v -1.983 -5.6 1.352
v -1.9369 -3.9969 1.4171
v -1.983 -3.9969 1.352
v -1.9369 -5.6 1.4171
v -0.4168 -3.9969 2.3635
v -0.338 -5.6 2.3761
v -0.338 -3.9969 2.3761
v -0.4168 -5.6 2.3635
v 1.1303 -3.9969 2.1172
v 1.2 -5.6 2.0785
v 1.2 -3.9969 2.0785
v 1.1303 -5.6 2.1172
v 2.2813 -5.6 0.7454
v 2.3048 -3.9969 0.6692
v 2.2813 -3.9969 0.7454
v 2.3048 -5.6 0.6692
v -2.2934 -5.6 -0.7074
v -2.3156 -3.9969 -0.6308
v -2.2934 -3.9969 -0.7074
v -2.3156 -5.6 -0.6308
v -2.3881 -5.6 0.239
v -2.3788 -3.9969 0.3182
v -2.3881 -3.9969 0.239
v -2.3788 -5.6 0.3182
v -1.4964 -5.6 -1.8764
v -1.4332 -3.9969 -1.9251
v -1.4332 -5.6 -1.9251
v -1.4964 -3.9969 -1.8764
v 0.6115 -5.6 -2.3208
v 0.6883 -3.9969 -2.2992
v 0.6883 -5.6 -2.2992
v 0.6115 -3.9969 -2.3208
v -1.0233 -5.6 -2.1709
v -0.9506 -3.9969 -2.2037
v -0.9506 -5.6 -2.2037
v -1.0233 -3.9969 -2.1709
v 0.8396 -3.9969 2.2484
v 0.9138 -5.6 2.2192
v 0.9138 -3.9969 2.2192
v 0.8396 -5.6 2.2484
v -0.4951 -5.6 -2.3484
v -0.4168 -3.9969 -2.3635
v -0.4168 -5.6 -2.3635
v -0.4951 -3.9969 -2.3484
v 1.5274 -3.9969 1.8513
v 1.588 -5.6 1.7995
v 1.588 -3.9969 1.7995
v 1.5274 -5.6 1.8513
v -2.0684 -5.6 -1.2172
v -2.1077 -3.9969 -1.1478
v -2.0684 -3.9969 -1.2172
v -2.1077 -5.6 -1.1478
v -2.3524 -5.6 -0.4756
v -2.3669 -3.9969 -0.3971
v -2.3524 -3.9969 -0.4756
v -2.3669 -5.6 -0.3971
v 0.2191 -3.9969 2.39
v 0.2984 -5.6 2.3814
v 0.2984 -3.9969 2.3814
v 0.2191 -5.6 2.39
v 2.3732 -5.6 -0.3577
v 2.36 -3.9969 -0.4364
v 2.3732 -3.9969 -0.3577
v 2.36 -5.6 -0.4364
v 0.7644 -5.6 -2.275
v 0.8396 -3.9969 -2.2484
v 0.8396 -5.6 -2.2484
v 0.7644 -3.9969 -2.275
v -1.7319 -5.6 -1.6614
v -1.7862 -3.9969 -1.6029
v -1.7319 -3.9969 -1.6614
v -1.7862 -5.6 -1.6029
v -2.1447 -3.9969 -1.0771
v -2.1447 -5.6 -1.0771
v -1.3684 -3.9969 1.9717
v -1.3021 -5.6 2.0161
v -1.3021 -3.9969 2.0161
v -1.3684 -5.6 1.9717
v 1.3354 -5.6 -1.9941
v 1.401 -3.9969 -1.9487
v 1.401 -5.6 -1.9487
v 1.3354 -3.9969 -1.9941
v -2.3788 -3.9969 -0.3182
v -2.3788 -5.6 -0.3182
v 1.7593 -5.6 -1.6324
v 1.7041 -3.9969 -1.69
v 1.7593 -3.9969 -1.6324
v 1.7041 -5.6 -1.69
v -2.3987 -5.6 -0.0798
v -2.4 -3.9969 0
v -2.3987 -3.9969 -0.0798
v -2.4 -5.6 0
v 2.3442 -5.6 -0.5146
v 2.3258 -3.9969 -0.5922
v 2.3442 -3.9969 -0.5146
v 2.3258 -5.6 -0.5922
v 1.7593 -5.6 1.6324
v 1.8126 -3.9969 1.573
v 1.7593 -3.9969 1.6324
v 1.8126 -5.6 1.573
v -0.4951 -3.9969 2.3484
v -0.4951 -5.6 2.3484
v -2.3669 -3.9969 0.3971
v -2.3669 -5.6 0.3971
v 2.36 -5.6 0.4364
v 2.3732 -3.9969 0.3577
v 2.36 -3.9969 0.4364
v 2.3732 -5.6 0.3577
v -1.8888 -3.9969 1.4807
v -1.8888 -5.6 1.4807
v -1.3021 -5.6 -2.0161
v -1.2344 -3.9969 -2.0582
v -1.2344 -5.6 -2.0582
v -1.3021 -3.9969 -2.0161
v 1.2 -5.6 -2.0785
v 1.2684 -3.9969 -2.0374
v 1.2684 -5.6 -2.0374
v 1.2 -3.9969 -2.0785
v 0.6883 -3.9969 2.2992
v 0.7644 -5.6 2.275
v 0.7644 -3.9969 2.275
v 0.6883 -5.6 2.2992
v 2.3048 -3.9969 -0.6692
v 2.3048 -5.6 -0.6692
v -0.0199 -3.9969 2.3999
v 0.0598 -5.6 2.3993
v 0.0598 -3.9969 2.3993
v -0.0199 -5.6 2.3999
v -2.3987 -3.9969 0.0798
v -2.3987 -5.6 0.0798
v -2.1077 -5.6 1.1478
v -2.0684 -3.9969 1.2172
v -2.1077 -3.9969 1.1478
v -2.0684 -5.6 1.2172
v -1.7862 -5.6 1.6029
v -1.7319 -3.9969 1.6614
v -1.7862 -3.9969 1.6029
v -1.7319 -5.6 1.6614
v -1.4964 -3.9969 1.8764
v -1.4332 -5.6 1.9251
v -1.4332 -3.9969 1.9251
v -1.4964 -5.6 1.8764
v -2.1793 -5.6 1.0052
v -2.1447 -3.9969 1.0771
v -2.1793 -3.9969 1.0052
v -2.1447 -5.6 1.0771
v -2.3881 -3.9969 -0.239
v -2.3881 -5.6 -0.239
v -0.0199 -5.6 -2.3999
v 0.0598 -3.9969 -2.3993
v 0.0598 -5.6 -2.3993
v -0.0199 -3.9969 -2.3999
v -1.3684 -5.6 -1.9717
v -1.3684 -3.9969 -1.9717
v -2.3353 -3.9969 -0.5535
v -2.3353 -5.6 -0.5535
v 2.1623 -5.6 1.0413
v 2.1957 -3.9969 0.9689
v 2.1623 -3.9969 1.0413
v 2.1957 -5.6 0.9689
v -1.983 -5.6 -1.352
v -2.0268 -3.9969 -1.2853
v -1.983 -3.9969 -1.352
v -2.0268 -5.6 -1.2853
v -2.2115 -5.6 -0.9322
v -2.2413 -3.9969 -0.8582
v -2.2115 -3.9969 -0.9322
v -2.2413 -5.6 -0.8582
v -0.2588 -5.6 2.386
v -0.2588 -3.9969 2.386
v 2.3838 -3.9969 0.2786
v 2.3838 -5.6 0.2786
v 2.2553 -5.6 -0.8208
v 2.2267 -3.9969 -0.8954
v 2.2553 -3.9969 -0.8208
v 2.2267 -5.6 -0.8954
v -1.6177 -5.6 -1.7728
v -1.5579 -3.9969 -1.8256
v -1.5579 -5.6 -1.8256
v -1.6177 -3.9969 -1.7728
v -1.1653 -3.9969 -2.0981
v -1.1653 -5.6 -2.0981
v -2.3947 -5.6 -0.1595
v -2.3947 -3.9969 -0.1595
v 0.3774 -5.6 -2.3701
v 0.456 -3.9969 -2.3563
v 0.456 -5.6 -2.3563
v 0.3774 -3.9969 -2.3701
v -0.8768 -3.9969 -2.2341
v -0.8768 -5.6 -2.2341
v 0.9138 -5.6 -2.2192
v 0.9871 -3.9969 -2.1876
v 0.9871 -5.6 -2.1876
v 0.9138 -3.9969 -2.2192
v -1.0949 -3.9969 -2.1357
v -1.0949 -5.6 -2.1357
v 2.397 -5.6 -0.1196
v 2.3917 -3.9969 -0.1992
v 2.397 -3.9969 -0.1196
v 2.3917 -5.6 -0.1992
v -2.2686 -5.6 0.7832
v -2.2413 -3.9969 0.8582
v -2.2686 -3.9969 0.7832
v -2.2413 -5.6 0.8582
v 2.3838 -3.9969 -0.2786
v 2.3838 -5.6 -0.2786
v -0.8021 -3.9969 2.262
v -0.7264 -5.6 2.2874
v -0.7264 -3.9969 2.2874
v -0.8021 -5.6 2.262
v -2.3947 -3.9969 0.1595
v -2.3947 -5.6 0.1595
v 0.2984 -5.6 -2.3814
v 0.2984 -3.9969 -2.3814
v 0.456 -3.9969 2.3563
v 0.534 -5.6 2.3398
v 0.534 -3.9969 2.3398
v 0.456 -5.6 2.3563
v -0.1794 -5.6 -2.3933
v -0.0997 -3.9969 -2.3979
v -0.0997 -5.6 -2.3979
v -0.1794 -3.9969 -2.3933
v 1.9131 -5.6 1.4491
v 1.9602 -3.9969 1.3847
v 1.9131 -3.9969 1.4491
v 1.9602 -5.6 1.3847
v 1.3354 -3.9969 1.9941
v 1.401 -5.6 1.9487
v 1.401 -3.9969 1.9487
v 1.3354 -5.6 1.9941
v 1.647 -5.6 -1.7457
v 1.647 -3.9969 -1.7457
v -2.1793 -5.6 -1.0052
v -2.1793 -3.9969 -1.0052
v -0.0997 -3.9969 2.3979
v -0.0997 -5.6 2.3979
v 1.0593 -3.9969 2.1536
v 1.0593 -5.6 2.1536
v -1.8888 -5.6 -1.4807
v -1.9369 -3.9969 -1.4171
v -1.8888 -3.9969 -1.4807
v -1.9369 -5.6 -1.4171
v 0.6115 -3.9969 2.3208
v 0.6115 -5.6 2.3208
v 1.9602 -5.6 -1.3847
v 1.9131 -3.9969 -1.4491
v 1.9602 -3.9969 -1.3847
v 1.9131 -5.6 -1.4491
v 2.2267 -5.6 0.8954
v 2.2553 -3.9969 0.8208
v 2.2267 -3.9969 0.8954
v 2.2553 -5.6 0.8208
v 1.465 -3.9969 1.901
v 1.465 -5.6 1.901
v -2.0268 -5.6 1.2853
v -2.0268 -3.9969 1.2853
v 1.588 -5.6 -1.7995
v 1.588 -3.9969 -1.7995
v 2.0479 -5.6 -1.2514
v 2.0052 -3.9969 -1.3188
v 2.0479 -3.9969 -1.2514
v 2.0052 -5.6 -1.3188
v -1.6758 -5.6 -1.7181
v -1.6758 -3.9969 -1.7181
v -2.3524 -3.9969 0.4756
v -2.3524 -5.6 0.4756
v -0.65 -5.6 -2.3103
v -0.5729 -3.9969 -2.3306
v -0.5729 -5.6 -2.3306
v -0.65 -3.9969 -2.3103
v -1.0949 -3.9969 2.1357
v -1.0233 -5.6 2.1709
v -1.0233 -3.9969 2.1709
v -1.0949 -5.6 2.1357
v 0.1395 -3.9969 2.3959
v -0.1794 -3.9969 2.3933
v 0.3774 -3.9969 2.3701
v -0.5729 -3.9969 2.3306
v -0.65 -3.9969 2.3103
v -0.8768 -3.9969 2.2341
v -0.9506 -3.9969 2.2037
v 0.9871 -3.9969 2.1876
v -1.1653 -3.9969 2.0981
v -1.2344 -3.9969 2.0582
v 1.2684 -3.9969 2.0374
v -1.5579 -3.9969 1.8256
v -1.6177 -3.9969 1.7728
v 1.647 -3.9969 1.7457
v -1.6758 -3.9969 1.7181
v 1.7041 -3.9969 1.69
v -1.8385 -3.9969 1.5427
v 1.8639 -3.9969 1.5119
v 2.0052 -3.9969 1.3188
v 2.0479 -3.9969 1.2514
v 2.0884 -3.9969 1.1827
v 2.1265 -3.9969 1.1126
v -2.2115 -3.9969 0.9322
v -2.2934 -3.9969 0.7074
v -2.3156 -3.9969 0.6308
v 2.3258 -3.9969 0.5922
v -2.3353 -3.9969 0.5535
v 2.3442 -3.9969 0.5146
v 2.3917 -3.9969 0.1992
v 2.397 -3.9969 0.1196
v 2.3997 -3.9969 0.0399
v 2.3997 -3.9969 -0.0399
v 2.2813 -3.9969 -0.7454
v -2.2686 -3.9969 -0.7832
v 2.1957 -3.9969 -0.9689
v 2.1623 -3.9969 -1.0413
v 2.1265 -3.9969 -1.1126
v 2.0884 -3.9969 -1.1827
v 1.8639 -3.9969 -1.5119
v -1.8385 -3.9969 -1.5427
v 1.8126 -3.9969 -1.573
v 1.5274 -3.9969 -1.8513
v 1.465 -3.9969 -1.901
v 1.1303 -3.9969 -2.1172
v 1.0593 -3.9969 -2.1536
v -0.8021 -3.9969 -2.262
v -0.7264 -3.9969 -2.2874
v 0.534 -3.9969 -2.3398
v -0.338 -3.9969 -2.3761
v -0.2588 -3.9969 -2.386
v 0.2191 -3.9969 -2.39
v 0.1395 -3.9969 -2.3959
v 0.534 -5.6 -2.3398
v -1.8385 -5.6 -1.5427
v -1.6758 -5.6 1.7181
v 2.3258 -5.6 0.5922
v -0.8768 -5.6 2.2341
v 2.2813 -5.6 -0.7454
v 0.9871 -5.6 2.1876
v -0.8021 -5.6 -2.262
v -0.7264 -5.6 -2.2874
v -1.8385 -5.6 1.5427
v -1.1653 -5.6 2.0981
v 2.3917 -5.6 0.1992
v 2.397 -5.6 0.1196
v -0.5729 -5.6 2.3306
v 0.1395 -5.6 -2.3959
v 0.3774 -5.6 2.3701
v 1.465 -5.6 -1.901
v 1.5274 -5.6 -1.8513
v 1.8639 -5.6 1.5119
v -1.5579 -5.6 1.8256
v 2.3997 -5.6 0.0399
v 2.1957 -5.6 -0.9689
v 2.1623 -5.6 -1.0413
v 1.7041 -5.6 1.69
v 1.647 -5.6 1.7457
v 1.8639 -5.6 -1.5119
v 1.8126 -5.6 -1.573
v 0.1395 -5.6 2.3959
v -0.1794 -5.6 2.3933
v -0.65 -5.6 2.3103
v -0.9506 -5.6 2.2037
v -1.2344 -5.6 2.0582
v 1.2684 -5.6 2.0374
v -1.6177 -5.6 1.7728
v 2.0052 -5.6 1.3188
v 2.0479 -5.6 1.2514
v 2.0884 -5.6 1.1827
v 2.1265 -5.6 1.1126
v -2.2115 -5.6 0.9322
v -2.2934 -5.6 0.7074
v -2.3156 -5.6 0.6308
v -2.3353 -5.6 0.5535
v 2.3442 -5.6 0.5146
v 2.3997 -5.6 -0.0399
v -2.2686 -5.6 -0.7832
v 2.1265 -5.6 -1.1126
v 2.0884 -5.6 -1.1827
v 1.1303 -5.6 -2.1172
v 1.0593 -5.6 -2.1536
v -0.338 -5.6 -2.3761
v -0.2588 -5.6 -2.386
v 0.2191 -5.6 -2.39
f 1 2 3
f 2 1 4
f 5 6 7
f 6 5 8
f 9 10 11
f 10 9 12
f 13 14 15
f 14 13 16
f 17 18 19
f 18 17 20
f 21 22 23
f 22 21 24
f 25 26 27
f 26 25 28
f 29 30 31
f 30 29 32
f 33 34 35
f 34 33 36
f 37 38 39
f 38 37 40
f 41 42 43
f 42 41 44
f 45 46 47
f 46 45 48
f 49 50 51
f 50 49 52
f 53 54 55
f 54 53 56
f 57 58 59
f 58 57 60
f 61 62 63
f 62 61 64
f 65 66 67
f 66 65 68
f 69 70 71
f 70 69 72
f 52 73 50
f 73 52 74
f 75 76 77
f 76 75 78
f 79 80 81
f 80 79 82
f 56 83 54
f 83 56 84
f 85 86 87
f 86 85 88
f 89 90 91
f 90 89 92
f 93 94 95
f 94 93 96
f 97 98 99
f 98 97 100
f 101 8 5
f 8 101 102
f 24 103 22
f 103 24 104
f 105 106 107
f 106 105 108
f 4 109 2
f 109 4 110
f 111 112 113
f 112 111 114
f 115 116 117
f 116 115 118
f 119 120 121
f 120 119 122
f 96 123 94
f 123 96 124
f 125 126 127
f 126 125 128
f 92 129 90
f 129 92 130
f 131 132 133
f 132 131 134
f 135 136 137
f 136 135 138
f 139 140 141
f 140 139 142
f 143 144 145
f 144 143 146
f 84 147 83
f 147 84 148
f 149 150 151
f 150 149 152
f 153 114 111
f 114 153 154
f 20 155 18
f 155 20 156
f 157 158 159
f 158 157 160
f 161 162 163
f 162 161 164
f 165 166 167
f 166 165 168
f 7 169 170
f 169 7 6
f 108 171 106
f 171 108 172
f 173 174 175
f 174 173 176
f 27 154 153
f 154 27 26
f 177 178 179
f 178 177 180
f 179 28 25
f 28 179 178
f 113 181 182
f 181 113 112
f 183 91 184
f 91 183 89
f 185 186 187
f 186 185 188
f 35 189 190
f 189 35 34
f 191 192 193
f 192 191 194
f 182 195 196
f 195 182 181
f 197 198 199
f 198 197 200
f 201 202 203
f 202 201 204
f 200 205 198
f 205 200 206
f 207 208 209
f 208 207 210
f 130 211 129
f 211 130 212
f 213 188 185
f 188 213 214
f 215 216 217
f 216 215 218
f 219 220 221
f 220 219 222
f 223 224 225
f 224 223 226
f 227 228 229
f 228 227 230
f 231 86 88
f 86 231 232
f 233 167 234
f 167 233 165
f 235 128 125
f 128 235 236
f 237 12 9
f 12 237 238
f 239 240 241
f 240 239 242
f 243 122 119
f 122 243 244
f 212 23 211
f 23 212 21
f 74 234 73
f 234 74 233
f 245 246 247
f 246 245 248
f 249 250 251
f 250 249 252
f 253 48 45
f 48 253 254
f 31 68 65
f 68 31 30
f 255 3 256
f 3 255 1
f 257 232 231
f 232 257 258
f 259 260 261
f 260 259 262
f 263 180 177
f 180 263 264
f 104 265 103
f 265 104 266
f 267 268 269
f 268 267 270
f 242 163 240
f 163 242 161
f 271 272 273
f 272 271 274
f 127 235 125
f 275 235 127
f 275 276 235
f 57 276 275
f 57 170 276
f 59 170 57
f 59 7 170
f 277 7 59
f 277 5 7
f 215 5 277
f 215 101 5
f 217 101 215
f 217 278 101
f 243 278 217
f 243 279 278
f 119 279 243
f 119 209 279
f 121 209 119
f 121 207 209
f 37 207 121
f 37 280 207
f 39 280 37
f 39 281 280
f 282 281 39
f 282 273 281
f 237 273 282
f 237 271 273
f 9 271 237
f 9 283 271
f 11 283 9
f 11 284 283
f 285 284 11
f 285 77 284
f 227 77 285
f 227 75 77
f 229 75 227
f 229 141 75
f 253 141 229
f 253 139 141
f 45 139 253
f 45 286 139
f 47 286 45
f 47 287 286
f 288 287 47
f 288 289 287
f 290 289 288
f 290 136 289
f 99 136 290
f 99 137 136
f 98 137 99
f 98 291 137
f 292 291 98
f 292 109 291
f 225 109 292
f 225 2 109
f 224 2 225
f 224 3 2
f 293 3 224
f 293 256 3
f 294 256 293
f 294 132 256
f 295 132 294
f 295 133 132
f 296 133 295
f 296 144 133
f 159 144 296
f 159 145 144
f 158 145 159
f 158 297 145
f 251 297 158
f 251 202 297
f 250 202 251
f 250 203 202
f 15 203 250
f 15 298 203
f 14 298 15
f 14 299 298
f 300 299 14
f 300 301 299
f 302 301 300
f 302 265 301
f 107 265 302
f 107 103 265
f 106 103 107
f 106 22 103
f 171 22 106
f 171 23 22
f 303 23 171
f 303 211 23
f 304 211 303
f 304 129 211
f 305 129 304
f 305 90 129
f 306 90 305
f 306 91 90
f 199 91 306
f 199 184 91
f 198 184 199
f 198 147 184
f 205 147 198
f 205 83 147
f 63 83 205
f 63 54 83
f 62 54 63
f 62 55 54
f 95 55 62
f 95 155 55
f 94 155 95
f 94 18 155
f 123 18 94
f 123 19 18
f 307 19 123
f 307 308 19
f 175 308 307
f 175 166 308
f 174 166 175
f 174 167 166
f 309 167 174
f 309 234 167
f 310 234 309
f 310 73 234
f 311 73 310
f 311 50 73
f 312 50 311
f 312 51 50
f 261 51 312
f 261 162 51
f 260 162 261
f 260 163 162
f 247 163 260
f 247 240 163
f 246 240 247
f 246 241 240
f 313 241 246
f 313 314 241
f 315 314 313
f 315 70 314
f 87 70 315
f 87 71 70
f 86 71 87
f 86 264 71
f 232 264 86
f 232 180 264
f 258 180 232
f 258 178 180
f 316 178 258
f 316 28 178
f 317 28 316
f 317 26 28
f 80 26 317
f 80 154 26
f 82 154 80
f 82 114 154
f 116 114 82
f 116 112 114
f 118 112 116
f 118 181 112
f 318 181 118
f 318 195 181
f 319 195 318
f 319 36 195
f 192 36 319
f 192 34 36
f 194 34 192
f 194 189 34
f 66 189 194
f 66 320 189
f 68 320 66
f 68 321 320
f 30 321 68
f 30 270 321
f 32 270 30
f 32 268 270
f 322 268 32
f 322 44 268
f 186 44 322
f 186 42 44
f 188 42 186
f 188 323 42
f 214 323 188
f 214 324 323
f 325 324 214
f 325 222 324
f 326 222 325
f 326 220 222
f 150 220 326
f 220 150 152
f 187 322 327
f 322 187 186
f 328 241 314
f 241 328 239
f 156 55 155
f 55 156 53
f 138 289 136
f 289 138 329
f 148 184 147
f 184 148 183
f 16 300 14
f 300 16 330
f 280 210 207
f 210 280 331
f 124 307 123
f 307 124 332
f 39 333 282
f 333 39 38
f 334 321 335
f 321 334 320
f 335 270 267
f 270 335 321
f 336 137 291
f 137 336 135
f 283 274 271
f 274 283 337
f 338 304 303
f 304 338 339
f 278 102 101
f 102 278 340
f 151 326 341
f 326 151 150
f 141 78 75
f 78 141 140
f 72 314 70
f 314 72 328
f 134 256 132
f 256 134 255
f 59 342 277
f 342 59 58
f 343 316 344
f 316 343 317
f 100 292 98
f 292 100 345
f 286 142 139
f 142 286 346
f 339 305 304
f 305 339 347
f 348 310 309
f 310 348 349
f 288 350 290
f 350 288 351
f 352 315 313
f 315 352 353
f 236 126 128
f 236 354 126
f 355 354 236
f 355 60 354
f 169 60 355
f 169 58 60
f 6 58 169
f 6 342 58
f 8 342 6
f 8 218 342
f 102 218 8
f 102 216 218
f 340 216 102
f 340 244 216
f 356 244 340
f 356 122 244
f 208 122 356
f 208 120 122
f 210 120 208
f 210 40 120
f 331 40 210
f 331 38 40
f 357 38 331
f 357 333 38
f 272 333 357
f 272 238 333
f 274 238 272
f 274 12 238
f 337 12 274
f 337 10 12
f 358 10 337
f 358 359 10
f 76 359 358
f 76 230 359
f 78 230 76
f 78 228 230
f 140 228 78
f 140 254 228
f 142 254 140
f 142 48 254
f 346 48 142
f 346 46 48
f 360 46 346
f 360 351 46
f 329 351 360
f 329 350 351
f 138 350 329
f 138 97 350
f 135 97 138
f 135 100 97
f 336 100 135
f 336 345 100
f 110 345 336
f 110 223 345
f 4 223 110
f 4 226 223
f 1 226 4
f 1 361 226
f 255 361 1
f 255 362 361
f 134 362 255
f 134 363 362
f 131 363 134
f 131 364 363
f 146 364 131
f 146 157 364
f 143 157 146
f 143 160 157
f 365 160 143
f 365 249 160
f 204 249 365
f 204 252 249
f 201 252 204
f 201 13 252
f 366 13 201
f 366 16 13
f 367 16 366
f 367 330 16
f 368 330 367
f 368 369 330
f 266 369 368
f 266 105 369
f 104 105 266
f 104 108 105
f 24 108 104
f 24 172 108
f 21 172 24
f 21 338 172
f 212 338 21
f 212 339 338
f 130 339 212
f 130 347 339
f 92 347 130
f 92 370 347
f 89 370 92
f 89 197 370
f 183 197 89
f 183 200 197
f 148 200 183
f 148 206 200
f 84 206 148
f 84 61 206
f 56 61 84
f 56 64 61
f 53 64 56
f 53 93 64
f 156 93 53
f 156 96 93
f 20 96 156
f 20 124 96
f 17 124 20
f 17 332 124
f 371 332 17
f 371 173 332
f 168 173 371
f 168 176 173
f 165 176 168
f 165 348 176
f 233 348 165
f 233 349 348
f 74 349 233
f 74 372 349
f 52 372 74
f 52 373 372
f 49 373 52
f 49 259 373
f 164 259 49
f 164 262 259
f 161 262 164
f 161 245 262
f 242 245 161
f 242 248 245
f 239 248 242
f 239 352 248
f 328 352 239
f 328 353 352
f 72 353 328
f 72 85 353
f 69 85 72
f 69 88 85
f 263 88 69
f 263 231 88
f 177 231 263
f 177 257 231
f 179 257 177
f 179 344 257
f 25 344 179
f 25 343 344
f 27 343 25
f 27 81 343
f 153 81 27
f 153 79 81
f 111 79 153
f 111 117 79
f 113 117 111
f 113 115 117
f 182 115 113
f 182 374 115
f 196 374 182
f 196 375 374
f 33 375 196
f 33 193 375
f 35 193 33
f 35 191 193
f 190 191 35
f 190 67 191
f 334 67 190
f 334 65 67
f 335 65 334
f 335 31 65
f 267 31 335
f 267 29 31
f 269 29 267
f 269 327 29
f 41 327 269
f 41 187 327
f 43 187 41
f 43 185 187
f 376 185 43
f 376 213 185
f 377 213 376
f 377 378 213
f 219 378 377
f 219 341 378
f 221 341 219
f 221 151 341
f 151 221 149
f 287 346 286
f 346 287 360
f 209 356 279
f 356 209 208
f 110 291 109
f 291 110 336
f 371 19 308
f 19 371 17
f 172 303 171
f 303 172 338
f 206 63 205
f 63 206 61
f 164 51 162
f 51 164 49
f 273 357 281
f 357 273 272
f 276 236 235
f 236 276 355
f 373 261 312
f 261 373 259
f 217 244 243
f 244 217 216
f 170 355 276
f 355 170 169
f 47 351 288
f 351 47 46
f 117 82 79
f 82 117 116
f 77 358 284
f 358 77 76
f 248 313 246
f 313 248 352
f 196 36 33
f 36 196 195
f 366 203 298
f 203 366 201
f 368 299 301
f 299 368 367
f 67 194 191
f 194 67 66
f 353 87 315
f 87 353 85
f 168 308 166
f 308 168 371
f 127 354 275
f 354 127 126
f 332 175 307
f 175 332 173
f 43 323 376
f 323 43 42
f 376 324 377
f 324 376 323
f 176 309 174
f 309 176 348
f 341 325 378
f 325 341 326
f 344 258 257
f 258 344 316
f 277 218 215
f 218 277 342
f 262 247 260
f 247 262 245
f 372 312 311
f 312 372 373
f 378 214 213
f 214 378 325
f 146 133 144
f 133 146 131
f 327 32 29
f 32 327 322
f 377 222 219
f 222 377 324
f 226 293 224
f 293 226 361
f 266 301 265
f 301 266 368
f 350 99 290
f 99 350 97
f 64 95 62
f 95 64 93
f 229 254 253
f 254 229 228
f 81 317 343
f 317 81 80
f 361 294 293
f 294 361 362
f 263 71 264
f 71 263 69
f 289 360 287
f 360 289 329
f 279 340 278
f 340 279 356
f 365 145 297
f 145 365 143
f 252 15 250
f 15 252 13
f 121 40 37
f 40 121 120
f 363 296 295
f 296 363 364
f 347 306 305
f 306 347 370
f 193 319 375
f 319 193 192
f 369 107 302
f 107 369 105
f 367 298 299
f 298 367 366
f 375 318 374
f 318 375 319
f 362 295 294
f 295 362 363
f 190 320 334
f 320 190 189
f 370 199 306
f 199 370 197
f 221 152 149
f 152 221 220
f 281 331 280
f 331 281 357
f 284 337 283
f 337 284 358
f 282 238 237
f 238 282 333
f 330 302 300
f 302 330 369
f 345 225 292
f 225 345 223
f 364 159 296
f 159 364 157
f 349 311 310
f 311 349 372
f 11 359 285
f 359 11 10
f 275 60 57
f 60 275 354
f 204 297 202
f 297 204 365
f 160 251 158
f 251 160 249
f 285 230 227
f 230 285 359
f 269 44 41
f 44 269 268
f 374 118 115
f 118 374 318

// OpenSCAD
use <../lib.scad>
use <u9049.scad>
$fa=1; $fs=0.2;
function ldraw_lib__35a(realsolid=false) = [
// 0 ~Moved to u9049
// 0 Name: 35a.dat
// 0 Author: [PTadmin]
// 0 !LDRAW_ORG Part UPDATE 2012-01
// 0 !LICENSE Licensed under CC BY 4.0 : see CAreadme.txt
// 
// 0 BFC CERTIFY CCW
  [0,"BFC","CERTIFY"],
  [0,"BFC","CCW"],
// 
// 0 !HISTORY 2012-03-30 [PTadmin] Official Update 2012-01
// 
// 
// 0 // ~Wheel 8 x 35 with 12 Spokes
// 1 16 0 0 0 1 0 0 0 1 0 0 0 1 u9049.dat
  [1,16,0,0,0,1,0,0,0,1,0,0,0,1, ldraw_lib__u9049(realsolid)],
];
module ldraw_lib__35a(step=0, col=false, unit=2/5, alt=false, line=0.2, solid=!$preview)
    makepoly(ldraw_lib__35a(solid), step=step, col=col, unit=unit, alt=alt, line=line, solid=solid);
ldraw_lib__35a(line=0.2);
